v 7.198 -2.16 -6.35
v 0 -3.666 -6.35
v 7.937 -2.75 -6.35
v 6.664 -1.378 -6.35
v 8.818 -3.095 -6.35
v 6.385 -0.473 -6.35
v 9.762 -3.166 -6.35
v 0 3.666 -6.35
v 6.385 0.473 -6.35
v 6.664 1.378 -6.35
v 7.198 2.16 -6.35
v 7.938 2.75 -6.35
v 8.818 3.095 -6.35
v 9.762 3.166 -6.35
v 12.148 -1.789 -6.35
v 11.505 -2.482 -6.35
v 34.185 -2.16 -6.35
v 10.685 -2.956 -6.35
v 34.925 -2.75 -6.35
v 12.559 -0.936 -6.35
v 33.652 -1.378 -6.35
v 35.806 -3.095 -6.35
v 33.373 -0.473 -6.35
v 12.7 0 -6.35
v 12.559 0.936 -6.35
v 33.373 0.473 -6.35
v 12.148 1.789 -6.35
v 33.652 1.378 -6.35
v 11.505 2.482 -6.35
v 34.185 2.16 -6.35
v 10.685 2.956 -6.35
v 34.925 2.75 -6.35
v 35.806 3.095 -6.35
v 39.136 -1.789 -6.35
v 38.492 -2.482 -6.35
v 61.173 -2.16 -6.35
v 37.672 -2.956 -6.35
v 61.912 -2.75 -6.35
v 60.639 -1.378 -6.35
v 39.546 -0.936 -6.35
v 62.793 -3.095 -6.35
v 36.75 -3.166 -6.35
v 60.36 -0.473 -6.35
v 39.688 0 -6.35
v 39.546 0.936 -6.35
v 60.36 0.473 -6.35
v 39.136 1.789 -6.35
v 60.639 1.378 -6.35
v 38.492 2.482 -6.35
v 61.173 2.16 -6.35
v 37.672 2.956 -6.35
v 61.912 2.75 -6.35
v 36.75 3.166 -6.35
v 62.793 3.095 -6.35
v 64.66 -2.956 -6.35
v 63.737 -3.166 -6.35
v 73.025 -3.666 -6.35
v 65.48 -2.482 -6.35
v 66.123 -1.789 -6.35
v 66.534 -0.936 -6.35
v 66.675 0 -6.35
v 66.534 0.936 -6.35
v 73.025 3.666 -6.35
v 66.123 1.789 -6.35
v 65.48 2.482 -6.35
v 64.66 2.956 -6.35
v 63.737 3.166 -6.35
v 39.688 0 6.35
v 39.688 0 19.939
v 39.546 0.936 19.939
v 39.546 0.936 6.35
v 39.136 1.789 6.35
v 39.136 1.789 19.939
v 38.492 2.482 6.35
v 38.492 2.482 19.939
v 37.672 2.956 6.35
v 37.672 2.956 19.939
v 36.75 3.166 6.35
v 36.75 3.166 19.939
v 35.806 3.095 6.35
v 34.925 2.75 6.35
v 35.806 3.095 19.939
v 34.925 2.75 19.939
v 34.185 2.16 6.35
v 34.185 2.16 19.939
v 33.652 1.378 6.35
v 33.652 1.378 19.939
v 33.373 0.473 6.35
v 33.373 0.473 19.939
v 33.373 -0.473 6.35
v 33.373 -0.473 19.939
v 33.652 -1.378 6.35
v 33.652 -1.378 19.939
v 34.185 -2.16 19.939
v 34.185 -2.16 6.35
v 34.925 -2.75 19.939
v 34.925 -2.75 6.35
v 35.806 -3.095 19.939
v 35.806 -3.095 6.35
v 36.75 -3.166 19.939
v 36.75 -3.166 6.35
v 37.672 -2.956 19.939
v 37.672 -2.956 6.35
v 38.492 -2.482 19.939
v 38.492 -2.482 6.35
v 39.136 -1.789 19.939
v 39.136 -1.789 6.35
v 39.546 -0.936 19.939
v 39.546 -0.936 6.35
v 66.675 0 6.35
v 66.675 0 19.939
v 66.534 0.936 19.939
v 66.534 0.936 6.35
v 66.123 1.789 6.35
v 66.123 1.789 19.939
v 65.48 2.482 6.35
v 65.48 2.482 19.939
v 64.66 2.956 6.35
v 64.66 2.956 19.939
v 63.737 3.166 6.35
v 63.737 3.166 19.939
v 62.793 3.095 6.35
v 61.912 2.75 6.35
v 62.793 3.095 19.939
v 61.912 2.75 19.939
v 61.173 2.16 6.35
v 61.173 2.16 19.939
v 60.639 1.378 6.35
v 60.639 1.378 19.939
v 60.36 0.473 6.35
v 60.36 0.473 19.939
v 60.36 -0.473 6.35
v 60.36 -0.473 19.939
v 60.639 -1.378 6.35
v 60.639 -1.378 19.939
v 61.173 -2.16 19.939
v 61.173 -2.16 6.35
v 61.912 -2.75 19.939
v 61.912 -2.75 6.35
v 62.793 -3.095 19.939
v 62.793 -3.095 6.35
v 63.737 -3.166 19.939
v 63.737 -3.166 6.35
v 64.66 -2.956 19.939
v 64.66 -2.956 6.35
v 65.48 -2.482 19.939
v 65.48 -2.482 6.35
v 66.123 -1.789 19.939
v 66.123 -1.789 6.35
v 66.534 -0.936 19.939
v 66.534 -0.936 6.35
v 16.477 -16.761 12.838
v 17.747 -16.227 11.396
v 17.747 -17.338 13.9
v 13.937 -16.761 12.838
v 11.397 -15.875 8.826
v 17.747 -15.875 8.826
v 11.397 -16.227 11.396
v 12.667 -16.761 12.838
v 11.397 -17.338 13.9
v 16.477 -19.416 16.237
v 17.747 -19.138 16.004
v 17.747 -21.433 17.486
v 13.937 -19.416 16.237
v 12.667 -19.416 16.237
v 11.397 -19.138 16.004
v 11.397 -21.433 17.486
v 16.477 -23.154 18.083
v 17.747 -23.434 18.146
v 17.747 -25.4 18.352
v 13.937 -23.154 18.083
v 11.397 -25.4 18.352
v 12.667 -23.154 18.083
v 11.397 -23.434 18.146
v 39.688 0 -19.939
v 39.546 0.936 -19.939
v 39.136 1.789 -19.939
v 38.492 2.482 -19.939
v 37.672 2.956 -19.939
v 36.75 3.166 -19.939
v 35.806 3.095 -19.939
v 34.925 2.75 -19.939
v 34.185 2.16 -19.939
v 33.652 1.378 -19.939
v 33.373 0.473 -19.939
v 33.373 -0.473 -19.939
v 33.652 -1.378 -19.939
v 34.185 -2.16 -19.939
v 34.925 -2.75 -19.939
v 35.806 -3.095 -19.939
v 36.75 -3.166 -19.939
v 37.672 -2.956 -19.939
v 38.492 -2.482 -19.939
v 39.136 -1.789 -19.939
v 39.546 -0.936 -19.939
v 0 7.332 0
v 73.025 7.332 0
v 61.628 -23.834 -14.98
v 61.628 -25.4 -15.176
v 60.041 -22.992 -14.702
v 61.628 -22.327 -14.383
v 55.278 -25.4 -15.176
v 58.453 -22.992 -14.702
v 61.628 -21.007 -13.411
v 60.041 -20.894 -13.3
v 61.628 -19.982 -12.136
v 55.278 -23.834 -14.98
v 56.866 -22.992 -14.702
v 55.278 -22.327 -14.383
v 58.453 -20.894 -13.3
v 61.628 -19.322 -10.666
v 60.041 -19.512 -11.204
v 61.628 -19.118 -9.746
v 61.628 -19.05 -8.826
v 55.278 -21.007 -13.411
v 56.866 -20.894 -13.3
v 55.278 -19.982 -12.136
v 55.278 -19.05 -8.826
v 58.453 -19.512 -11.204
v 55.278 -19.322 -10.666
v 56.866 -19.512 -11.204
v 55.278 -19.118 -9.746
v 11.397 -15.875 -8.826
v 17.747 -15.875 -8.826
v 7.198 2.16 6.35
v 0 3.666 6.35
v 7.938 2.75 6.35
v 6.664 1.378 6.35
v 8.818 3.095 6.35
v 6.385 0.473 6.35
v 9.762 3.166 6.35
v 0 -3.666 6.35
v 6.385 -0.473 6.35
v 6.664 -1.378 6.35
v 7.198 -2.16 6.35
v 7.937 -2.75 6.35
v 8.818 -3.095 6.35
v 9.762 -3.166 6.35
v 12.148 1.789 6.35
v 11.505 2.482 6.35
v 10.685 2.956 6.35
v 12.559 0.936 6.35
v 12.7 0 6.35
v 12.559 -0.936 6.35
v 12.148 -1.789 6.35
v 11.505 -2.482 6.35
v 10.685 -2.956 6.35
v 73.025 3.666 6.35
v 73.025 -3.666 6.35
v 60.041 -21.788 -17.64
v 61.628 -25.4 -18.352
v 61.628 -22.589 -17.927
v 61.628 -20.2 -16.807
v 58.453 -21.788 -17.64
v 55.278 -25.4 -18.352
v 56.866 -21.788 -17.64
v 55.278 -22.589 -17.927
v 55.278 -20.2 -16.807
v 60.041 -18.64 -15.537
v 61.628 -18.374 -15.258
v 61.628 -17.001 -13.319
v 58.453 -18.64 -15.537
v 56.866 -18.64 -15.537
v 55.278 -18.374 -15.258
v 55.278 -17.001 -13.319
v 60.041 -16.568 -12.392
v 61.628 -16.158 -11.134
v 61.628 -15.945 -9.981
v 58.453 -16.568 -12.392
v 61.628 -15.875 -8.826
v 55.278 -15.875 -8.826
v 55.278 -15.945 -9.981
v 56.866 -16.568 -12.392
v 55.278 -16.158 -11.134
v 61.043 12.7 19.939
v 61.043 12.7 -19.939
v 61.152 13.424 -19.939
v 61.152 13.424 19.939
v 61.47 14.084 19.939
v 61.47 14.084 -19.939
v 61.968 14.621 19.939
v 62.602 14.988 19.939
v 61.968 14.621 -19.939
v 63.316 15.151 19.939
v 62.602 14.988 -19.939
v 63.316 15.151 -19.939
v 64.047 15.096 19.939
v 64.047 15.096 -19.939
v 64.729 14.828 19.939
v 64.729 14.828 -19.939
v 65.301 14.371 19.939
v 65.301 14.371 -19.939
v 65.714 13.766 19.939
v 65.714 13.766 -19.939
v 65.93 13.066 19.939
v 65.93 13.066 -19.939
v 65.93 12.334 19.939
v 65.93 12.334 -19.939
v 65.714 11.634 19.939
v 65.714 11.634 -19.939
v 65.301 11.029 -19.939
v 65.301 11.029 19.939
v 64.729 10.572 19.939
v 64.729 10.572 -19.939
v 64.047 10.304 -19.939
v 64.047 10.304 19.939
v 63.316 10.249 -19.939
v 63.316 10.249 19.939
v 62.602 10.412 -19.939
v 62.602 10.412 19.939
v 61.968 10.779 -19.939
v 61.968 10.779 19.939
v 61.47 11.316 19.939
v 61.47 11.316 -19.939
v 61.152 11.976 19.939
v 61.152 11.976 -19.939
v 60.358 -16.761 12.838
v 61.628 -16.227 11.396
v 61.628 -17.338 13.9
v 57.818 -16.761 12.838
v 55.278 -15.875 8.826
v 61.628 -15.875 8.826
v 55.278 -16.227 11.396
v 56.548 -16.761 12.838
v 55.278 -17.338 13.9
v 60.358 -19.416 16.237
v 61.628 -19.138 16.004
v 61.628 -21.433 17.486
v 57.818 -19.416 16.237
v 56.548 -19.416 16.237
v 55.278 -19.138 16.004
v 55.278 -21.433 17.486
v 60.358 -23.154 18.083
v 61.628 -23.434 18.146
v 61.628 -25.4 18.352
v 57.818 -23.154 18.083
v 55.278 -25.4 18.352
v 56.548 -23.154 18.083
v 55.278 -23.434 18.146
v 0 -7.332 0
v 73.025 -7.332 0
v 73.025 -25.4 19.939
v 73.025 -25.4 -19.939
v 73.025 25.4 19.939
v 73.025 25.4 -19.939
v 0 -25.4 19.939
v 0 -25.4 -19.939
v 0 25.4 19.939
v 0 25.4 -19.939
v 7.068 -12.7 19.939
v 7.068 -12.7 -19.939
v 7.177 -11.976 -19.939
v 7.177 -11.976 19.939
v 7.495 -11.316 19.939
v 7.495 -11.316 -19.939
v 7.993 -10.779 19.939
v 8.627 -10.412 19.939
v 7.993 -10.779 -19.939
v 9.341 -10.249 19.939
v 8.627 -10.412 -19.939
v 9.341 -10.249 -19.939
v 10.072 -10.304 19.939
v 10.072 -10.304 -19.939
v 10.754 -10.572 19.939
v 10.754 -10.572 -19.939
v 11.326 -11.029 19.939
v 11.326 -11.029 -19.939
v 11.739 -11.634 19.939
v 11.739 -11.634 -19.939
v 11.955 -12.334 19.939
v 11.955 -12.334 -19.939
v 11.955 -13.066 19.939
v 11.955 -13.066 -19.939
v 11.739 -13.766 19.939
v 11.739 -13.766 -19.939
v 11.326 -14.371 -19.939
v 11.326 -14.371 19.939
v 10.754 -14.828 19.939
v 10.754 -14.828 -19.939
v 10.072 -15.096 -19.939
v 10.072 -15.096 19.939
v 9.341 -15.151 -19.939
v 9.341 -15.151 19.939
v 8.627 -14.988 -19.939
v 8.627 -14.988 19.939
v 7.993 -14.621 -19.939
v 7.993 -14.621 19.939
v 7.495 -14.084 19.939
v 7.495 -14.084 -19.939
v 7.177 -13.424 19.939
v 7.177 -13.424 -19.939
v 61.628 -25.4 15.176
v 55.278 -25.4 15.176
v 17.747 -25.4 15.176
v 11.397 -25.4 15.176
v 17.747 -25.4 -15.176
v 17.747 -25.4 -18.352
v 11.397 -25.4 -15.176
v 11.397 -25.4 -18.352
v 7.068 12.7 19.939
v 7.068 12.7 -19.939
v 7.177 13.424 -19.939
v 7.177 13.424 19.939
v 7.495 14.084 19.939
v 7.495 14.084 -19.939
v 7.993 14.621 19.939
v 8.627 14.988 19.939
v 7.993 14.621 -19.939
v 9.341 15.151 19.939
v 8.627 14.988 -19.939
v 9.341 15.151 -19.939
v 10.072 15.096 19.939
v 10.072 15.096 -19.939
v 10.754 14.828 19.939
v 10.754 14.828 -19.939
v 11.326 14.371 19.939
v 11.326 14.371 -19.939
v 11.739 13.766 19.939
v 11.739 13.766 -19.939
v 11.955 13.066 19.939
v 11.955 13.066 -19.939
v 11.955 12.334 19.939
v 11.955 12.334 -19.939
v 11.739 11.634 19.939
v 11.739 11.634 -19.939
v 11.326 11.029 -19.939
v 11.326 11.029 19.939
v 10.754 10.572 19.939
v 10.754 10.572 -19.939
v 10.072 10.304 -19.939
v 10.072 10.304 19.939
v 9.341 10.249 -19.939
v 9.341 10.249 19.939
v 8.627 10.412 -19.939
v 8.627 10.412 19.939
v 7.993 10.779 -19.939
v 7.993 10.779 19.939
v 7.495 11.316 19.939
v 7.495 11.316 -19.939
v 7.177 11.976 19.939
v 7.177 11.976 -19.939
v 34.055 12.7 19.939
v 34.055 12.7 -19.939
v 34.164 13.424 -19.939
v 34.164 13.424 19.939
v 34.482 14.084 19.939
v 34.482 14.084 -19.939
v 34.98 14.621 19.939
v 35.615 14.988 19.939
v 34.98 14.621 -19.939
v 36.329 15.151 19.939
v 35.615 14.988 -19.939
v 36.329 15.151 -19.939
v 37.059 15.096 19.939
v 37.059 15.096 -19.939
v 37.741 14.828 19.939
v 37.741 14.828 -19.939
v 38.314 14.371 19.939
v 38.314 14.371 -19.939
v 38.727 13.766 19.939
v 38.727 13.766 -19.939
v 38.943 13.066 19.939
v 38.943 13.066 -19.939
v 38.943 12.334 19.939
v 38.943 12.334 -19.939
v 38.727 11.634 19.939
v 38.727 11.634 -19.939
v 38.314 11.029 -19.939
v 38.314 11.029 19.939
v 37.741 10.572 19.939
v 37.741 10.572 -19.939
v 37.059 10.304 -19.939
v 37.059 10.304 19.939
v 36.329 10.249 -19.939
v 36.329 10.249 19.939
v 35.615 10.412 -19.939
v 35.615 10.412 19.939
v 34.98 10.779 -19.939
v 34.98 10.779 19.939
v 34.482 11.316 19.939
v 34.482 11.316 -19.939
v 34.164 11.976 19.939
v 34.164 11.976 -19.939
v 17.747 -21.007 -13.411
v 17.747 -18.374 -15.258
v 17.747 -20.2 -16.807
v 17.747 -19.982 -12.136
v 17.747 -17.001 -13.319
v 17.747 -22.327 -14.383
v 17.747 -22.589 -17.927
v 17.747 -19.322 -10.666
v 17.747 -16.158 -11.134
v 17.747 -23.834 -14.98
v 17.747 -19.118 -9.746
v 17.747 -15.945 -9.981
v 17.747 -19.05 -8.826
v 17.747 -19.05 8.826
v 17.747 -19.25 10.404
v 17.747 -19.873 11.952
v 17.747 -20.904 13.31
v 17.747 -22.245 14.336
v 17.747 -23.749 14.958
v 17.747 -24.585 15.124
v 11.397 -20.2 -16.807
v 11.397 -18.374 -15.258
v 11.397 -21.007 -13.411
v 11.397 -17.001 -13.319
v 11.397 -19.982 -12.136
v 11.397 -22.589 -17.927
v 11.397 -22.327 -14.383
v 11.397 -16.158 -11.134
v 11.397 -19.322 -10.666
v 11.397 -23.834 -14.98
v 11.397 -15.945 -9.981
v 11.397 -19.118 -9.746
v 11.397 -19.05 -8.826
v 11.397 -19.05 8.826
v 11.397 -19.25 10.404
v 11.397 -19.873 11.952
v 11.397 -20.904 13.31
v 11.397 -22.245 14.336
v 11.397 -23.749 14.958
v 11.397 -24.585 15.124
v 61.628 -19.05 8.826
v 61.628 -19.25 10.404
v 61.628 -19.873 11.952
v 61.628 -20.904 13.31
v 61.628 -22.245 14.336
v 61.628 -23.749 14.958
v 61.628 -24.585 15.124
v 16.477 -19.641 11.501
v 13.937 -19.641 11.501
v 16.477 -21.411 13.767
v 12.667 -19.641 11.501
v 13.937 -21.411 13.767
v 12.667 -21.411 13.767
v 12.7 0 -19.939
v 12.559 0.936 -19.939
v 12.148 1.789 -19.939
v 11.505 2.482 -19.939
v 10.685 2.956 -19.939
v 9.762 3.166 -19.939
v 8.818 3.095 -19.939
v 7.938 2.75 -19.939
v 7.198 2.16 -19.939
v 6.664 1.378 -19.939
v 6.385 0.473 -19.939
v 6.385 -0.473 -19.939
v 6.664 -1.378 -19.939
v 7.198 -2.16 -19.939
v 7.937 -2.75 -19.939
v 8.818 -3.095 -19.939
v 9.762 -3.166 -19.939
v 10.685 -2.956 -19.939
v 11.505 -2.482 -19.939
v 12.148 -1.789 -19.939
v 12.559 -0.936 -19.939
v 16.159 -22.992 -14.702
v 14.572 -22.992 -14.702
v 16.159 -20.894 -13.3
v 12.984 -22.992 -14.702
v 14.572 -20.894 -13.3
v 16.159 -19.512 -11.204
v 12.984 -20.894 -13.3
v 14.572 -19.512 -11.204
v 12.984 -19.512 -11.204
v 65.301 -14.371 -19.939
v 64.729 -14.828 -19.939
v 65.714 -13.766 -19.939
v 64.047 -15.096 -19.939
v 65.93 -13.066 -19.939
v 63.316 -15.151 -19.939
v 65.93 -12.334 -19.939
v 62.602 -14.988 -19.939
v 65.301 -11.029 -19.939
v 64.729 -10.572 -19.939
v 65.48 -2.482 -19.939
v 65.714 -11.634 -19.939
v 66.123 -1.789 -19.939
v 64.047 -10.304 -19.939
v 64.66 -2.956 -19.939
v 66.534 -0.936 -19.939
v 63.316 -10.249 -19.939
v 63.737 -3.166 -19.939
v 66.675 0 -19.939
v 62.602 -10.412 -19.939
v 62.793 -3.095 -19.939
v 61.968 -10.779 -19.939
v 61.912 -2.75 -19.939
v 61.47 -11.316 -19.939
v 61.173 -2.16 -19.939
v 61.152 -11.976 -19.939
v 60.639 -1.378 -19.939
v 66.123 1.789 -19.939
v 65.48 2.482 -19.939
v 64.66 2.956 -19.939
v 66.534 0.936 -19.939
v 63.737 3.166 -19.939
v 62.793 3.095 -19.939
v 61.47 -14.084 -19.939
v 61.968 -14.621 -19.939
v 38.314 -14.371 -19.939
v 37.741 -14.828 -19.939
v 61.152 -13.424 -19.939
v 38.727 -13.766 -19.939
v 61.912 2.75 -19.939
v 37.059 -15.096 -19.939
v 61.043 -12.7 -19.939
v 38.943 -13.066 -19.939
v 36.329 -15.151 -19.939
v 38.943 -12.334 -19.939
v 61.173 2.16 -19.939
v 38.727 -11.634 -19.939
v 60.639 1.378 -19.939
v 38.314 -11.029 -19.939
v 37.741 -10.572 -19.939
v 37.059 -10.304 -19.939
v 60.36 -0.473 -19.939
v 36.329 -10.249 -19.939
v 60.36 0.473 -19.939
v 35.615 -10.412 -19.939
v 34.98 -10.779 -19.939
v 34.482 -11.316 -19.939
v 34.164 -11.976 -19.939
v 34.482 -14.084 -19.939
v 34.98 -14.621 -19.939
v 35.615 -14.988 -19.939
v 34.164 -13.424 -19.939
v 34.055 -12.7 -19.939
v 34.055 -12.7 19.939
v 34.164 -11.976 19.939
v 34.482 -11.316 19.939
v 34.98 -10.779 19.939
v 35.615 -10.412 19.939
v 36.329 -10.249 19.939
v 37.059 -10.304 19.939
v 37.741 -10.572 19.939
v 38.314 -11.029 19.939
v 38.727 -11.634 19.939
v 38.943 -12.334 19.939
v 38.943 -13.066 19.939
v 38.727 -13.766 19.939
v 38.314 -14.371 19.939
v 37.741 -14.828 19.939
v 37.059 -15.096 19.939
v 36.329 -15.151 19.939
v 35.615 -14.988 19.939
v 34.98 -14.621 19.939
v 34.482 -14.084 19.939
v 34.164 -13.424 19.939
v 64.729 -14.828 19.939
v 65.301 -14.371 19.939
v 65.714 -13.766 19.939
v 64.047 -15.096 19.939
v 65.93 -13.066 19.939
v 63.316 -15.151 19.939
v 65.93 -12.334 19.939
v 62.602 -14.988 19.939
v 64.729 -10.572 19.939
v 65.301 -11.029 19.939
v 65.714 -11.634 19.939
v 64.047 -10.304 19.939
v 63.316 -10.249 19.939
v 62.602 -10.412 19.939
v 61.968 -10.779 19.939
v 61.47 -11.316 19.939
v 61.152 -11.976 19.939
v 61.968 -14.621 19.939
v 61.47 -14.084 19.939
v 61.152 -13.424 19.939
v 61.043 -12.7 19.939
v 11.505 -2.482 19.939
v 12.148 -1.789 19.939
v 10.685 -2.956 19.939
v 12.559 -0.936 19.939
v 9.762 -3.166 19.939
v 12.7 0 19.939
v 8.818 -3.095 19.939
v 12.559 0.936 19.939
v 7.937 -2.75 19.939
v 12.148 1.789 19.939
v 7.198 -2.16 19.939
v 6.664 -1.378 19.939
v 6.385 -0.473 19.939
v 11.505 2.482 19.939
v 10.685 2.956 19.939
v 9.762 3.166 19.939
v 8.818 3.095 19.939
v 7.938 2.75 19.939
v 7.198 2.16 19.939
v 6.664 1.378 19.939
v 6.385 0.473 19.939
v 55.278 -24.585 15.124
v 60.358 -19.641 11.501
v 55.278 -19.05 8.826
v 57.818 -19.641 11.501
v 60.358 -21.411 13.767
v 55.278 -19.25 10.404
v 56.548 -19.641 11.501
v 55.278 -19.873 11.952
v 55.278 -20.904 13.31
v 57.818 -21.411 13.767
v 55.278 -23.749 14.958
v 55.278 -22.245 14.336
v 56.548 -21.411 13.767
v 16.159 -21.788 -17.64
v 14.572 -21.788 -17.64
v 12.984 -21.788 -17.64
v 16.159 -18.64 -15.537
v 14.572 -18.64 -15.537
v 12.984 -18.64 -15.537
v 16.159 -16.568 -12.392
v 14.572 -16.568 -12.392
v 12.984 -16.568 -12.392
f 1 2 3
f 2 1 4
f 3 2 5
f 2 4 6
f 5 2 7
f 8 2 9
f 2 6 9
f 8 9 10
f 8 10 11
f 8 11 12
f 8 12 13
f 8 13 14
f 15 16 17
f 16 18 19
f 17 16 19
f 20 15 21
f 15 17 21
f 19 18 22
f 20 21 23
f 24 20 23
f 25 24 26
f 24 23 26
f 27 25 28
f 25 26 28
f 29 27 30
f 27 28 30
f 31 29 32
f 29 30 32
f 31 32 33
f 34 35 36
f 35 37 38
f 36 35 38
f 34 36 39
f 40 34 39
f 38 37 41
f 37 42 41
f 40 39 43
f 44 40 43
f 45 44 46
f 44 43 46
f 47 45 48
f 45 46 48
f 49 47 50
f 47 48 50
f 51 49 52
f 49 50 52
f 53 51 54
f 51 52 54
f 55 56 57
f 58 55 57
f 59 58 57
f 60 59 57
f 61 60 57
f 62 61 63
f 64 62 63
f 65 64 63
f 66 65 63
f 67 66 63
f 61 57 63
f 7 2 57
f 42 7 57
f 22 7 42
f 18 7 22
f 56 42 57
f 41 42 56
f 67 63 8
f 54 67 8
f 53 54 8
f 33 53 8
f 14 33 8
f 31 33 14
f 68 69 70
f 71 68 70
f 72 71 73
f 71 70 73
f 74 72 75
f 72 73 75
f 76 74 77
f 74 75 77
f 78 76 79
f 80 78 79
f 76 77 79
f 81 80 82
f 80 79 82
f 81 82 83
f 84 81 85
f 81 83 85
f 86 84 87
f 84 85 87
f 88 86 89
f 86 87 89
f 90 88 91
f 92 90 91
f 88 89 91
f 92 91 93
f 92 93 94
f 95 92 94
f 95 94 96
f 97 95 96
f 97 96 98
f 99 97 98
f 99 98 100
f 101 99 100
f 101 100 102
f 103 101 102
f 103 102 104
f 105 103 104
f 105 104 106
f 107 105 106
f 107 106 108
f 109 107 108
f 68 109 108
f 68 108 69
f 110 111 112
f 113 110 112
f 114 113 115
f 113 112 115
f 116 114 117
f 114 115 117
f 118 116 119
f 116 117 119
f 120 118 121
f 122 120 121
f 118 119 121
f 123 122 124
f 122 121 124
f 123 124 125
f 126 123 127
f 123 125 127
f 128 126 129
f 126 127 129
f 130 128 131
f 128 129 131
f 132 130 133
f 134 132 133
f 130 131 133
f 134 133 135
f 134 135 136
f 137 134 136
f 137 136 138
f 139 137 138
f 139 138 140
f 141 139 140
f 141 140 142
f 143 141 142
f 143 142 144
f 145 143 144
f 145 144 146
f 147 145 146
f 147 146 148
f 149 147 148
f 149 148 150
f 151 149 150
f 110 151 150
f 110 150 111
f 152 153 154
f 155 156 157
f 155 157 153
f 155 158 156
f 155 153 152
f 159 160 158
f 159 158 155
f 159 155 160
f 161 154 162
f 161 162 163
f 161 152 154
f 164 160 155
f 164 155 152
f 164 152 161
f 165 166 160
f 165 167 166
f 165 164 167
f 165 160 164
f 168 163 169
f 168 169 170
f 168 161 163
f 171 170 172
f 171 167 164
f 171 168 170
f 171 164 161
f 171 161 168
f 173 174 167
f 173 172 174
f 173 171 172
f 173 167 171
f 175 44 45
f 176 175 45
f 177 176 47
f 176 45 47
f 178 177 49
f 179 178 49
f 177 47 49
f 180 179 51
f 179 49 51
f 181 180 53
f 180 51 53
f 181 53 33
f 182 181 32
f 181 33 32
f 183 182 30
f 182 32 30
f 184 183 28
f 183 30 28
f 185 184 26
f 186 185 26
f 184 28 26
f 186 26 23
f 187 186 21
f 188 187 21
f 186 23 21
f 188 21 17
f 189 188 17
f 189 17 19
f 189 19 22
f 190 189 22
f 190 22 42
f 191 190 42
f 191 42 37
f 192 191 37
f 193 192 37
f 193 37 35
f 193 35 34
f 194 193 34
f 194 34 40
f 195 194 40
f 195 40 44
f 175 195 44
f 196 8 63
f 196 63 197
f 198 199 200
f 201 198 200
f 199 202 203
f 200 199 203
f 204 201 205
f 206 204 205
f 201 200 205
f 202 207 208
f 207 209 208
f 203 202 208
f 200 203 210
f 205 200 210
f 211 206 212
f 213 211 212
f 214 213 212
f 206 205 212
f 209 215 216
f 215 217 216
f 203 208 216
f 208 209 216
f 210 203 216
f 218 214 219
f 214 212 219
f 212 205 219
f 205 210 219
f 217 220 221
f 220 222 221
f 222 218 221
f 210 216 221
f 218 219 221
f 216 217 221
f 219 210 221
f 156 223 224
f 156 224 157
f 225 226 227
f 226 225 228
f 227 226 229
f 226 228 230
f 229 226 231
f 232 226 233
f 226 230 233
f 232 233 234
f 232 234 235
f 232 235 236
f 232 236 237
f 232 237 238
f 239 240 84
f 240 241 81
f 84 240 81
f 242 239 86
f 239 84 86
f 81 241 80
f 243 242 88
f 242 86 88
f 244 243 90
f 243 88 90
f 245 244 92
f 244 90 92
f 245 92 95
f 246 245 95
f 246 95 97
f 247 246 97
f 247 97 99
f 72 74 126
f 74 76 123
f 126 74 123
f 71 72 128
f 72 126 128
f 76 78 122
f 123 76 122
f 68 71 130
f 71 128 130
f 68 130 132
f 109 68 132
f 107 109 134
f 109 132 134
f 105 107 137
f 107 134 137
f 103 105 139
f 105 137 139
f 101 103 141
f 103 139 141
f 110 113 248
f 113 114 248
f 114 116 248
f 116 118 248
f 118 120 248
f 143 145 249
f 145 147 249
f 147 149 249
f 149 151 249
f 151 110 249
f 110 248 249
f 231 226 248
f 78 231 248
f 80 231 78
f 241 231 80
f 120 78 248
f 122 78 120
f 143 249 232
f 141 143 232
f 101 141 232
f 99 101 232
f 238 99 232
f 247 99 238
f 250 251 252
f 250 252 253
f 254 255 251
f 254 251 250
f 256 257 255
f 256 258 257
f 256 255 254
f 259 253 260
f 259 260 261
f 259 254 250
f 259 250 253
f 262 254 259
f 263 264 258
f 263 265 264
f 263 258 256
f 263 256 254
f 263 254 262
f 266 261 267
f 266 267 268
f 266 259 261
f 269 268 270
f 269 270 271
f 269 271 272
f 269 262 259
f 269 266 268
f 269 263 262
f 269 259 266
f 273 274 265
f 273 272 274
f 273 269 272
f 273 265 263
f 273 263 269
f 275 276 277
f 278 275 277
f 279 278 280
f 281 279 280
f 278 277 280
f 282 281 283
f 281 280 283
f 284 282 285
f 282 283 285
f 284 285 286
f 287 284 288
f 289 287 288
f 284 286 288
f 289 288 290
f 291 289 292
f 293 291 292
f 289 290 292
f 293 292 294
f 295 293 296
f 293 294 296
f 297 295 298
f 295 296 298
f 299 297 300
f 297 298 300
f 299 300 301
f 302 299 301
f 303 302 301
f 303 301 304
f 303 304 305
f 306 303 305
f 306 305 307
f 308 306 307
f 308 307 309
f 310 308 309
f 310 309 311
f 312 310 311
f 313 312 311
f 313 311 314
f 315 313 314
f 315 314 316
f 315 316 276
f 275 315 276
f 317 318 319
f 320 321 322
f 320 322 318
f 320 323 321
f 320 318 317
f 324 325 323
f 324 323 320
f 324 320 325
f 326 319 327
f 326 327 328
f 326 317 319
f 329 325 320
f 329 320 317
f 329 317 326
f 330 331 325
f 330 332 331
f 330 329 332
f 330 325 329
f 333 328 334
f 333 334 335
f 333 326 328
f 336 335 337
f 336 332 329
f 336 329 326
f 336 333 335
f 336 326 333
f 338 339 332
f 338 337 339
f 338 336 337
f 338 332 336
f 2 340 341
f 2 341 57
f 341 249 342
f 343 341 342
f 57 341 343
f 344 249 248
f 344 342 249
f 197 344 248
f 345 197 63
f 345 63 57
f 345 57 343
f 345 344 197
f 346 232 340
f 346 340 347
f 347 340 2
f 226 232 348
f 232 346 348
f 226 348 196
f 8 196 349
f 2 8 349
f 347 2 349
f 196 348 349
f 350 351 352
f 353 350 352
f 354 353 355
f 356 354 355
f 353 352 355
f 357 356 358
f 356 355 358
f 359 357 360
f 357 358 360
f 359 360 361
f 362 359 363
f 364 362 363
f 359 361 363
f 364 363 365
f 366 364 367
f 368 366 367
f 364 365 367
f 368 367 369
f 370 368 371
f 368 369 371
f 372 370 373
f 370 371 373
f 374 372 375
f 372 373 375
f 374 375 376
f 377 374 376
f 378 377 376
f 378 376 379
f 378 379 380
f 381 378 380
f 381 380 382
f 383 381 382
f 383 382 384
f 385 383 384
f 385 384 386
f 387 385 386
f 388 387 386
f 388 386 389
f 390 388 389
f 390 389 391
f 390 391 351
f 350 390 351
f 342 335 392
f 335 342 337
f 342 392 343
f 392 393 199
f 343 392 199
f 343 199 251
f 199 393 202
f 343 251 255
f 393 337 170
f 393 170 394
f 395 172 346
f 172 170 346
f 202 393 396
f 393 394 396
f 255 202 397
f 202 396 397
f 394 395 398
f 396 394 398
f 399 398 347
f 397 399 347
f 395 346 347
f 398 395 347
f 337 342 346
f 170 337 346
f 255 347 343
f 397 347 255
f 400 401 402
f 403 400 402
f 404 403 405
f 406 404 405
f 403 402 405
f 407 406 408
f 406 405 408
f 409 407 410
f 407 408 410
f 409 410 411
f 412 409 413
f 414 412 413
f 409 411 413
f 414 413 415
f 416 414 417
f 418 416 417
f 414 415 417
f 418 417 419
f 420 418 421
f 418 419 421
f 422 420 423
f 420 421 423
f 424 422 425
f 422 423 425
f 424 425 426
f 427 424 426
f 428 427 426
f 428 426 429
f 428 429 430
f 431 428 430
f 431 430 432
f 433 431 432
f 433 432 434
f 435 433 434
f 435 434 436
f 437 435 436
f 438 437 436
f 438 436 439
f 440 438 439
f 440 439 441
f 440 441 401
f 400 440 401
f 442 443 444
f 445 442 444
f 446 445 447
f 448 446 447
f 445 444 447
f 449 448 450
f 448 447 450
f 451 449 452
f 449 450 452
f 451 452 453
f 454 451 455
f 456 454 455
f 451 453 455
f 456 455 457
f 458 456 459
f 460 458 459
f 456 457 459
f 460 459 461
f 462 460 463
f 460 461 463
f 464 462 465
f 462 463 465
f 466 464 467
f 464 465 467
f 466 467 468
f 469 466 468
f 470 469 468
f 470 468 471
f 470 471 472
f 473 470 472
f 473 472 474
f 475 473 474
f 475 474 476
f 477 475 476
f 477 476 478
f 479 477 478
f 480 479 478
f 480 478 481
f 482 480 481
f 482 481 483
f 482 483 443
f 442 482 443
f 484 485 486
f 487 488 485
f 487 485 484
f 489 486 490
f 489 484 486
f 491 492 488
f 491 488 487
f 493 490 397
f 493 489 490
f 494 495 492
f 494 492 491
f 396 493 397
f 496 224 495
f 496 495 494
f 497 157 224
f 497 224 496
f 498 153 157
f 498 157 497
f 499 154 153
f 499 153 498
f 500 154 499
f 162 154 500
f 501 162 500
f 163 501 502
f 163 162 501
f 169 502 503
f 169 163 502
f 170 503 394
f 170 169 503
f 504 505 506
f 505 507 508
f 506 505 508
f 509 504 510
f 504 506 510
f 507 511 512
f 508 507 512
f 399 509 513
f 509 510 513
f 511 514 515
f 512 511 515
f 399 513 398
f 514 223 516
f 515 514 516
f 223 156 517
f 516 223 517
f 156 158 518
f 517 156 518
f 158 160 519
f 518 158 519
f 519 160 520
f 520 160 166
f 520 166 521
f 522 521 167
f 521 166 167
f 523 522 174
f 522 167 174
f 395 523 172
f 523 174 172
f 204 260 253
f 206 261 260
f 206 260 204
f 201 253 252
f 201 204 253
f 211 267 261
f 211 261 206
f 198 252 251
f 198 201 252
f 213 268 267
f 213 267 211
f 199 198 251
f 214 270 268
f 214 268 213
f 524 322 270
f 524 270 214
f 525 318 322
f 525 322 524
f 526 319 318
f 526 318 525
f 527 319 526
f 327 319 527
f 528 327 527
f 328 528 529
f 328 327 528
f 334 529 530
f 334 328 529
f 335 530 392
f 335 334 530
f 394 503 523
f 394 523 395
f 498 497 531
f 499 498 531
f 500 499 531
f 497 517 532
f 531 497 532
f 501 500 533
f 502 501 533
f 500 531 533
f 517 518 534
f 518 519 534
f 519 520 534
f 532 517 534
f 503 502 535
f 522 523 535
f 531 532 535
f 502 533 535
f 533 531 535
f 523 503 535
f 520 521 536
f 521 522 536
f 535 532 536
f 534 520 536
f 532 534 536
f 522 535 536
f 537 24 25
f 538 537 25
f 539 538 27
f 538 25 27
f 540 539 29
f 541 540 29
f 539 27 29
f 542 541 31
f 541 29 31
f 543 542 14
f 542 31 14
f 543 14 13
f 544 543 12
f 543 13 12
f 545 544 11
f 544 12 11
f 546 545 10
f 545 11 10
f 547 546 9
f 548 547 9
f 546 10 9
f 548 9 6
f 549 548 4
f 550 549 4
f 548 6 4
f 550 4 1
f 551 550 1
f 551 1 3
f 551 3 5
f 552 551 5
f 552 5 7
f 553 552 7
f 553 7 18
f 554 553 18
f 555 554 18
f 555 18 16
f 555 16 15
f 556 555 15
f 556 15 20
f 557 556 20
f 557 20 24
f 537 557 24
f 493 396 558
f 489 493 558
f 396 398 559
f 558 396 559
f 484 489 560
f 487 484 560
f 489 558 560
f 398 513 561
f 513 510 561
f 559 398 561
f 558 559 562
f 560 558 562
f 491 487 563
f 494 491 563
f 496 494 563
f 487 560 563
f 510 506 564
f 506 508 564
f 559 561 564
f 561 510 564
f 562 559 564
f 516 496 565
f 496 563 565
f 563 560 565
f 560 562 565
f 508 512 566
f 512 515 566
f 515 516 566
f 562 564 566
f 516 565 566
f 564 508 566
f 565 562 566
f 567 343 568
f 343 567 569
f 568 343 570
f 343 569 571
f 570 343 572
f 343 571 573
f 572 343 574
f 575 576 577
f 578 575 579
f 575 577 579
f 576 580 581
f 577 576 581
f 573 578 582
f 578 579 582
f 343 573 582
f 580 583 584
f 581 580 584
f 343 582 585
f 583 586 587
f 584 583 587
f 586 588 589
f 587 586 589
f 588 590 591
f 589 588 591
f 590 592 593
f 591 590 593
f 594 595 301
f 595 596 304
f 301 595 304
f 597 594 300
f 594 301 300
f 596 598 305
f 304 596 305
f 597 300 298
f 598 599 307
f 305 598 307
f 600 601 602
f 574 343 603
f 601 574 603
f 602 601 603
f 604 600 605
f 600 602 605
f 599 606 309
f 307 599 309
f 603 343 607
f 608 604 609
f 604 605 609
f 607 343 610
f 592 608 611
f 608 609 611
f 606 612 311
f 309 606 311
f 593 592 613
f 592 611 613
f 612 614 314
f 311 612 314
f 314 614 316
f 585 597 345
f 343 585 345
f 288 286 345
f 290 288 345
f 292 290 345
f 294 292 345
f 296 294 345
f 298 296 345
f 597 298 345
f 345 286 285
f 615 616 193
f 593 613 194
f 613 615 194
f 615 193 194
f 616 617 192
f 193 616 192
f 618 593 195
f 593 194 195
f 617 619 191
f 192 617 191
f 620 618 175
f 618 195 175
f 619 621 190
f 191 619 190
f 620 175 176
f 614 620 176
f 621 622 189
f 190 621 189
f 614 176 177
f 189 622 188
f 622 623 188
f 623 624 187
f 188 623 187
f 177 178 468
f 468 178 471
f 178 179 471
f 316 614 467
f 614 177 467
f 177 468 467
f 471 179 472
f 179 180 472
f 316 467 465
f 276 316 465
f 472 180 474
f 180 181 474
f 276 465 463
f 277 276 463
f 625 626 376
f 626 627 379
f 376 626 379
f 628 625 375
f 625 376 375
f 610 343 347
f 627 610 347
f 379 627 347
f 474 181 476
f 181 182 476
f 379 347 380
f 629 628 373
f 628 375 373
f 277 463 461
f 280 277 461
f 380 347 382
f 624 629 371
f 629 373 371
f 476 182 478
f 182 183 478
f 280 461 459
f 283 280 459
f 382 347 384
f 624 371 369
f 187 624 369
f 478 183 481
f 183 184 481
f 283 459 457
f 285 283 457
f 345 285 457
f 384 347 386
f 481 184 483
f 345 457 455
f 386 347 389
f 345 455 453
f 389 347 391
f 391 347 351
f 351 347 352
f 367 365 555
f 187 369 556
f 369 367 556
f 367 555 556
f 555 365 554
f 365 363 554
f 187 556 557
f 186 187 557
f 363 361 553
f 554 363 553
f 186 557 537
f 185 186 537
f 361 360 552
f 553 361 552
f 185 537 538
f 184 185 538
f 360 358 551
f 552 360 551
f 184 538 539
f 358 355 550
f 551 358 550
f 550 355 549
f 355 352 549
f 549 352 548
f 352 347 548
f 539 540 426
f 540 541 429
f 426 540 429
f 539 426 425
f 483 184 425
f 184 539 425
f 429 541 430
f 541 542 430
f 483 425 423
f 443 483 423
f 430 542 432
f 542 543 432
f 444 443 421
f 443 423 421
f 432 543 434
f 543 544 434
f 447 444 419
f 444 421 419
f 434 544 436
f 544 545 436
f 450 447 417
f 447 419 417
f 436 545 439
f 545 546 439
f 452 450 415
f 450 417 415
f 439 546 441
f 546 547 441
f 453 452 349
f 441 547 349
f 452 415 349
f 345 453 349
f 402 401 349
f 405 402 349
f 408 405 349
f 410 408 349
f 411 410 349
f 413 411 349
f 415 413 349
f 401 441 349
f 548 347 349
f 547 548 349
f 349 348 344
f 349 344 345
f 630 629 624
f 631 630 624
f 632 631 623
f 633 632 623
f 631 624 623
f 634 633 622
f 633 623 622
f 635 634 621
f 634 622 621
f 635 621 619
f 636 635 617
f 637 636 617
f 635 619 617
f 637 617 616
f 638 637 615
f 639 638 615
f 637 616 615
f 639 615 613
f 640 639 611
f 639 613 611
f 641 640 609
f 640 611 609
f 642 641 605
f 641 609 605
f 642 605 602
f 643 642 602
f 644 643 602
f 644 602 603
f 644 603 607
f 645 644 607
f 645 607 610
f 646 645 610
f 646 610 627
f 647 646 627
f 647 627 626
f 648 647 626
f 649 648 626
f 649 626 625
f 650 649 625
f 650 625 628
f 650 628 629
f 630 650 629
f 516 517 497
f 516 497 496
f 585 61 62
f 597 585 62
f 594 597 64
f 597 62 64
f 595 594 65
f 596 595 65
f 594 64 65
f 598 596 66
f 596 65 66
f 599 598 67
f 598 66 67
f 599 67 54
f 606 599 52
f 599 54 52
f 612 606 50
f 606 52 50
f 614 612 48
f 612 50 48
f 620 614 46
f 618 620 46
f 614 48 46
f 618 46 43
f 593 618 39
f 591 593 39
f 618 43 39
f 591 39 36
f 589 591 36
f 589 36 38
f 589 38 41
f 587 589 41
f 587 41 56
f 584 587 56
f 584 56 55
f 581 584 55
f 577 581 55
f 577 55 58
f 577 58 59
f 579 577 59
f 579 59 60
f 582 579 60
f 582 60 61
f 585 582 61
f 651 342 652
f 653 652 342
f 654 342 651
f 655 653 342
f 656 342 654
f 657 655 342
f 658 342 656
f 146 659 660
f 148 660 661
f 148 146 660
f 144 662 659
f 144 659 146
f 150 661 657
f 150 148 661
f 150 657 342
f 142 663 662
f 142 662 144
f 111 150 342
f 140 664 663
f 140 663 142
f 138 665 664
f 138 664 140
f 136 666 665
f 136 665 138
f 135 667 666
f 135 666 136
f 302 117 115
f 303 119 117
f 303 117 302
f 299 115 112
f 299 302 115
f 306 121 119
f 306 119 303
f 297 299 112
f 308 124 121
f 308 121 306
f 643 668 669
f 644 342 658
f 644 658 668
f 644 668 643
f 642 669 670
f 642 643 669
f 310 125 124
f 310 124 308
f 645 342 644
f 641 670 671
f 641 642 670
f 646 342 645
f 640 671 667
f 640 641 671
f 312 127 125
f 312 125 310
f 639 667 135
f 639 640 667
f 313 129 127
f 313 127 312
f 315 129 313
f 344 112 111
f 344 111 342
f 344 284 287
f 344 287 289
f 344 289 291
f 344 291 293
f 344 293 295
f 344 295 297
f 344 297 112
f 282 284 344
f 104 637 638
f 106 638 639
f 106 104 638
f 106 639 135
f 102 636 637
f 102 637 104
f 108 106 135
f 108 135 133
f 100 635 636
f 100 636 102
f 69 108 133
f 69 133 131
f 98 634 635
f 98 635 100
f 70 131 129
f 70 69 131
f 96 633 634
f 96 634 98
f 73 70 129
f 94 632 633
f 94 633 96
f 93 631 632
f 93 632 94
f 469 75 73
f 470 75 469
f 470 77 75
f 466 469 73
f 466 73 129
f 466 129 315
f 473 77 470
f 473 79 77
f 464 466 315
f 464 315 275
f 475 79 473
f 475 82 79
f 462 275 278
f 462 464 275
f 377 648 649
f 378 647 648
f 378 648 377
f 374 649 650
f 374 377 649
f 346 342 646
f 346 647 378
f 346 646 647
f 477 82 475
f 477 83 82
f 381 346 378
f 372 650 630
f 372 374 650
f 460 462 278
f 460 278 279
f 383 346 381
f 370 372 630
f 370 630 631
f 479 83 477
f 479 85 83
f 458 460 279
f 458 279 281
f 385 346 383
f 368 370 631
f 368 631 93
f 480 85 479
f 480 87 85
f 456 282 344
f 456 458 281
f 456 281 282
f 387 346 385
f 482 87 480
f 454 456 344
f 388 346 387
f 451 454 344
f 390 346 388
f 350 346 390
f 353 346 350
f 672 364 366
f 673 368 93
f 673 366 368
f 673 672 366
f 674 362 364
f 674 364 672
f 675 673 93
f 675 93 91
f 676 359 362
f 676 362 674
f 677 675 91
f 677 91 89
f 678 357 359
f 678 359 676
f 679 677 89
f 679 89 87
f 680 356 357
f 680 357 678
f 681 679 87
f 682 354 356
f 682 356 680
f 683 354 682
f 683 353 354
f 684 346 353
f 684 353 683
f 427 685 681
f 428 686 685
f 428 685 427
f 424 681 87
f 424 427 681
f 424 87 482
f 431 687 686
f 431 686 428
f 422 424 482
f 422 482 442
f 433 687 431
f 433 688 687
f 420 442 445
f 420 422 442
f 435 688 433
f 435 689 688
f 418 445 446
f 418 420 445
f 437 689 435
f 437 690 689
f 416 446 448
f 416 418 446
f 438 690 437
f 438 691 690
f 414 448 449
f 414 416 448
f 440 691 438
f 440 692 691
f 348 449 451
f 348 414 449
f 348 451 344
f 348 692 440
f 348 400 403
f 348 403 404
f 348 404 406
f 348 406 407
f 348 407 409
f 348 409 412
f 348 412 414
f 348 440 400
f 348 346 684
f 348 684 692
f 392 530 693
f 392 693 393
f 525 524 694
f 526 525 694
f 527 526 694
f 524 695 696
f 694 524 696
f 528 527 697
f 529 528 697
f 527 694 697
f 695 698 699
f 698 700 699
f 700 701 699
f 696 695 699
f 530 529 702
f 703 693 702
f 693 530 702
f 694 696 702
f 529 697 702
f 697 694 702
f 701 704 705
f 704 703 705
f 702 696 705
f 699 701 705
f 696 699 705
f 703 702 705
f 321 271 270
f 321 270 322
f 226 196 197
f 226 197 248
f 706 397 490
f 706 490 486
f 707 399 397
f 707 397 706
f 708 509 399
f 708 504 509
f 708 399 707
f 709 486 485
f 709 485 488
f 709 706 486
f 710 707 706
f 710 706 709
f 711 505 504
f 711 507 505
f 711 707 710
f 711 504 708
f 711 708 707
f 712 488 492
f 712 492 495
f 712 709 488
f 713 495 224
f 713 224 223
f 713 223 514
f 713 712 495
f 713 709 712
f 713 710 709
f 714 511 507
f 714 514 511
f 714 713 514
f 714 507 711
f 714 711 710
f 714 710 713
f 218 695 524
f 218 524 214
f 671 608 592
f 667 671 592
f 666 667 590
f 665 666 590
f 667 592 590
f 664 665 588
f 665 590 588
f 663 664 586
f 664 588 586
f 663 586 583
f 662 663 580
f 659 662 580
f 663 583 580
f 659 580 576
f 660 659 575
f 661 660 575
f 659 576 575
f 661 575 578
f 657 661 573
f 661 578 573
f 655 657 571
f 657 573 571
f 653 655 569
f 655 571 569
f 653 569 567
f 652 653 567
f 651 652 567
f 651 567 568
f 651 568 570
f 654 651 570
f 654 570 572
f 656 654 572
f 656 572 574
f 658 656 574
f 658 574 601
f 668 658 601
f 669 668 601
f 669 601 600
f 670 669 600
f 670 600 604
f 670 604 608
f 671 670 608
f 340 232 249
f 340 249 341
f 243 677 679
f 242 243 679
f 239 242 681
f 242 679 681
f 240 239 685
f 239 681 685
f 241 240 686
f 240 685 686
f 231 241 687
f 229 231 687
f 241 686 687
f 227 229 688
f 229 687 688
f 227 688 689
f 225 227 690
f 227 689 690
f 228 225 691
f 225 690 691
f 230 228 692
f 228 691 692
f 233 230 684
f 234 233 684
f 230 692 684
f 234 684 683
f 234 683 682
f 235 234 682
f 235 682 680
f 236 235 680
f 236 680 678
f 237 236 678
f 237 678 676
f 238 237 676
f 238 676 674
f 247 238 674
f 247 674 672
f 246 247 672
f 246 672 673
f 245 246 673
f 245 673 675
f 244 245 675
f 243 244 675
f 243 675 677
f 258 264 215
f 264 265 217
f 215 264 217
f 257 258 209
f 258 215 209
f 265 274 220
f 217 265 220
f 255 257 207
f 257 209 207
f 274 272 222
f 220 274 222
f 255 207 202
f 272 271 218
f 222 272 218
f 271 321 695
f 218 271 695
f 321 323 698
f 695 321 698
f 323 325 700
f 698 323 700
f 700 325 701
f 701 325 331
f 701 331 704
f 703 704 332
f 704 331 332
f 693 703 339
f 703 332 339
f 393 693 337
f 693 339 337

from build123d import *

# Parameters (mm, degrees)
SKETCH1_W                    = 39.878
SKETCH1_H                    = 50.8
BOSS_EXTRUDE1_DEPTH          = 73.025
CUT_EXTRUDE2_DEPTH           = 80.845941325
SKETCH9_R                    = 3.175
CUT_EXTRUDE4_DEPTH           = 87.994629196
CUT_SWEEP1_START             = 11.39698
CUT_SWEEP1_DEPTH             = 6.35
CUT_SWEEP1_START_2           = 55.27802
CUT_SWEEP1_2_DEPTH           = 6.35
F_10_0_1935_DIAMETER_HOLE1_D = 4.9149


# Read off the part's stored shape, not the designer's step: Cut-Sweep1
with BuildPart() as part:
    # Sketch1 → Boss-Extrude1 (new body)
    with BuildSketch(Plane(origin=(0, 0, 0), x_dir=(0, 0, -1), z_dir=(1, 0, 0))):
        Rectangle(SKETCH1_W, SKETCH1_H)
    extrude(amount=BOSS_EXTRUDE1_DEPTH)

    # Sketch3 → Cut-Extrude2 (cut, through all)
    with BuildSketch(Plane(origin=(73.025, 0, 0), x_dir=(0, 0, -1), z_dir=(1, 0, 0))):
        Polygon((6.35, 3.666174209), (0, 7.332348419), (-6.35, 3.666174209), (-6.35, -3.666174209), (0, -7.332348419), (6.35, -3.666174209), align=None)
    extrude(amount=-CUT_EXTRUDE2_DEPTH, mode=Mode.SUBTRACT)

    # Sketch9 → Cut-Extrude4 (cut, through all)
    with BuildSketch(Plane.XY.offset(19.939)):
        with Locations((9.525, 0)):
            Circle(SKETCH9_R)
        with Locations((36.5125, 0)):
            Circle(SKETCH9_R)
        with Locations((63.5, 0)):
            Circle(SKETCH9_R)
    extrude(amount=-CUT_EXTRUDE4_DEPTH, mode=Mode.SUBTRACT)

    # Cut-Sweep1 outline → Cut-Sweep1 (cut)
    with BuildSketch(Plane.YZ.offset(CUT_SWEEP1_START)):
        with BuildLine():
            add(Edge.make_bspline(
                [(-25.4, -15.1765), (-24.598155248, -15.176498148), (-23.769283214, -15.020738143), (-22.215051315, -14.383830521), (-21.491956074, -13.903011028), (-20.295262296, -12.697601351), (-19.822999045, -11.974685313), (-19.200412611, -10.432467289), (-19.050000001, -9.615195458), (-19.050000001, -8.8265)],
                knots=[0.025274121, 0.025274121, 0.025274121, 0.025274121, 0.088238261, 0.088238261, 0.1512024, 0.1512024, 0.214166539, 0.214166539, 0.277130679, 0.277130679, 0.277130679, 0.277130679], degree=3))
            Line((-25.4, -15.1765), (-25.4, -18.3515))
            add(Edge.make_bspline(
                [(-25.4, -18.3515), (-24.198801546, -18.351496292), (-22.962872636, -18.121523992), (-20.613629157, -17.158829003), (-19.544786623, -16.448168929), (-17.736040932, -14.626249639), (-17.037863537, -13.557113154), (-16.097253947, -11.227115749), (-15.875000001, -10.018094012), (-15.875000001, -8.8265)],
                knots=[0.025274121, 0.025274121, 0.025274121, 0.025274121, 0.088238261, 0.088238261, 0.1512024, 0.1512024, 0.214166539, 0.214166539, 0.277130679, 0.277130679, 0.277130679, 0.277130679], degree=3))
            Line((-15.875000001, -8.8265), (-15.875000001, 8.8265))
            add(Edge.make_bspline(
                [(-15.875000001, 8.8265), (-15.875000001, 10.154104999), (-16.148999917, 11.520161211), (-17.372865777, 14.155841649), (-18.276999964, 15.317491554), (-20.555768544, 17.157379798), (-21.841496853, 17.764411009), (-23.809992027, 18.242095131), (-24.446817823, 18.324942193), (-25.191458658, 18.349851774), (-25.29770495, 18.351585251), (-25.4, 18.351845725)],
                knots=[0.722867996, 0.722867996, 0.722867996, 0.722867996, 0.792150997, 0.792150997, 0.861433998, 0.861433998, 0.930716999, 0.930716999, 0.9653585, 0.9653585, 0.971358568, 0.971358568, 0.971358568, 0.971358568], degree=3))
            Line((-25.4, 18.351845725), (-25.4, 15.17649118))
            add(Edge.make_bspline(
                [(-19.050000001, 8.8265), (-19.050000001, 9.700178846), (-19.23785851, 10.633454764), (-20.043385287, 12.368213809), (-20.66121287, 13.161804707), (-22.160632803, 14.372442861), (-23.034678664, 14.786809878), (-24.336487637, 15.102712151), (-24.768983217, 15.158942974), (-25.259087559, 15.175338178), (-25.32981717, 15.176428808), (-25.4, 15.17649118)],
                knots=[0.722867996, 0.722867996, 0.722867996, 0.722867996, 0.792150997, 0.792150997, 0.861433998, 0.861433998, 0.930716999, 0.930716999, 0.9653585, 0.9653585, 0.971266218, 0.971266218, 0.971266218, 0.971266218], degree=3))
            Line((-19.050000001, 8.8265), (-19.050000001, -8.8265))
        make_face()
    extrude(amount=CUT_SWEEP1_DEPTH, mode=Mode.SUBTRACT)

    # Cut-Sweep1 2 outline → Cut-Sweep1 2 (cut)
    with BuildSketch(Plane.YZ.offset(CUT_SWEEP1_START_2)):
        with BuildLine():
            add(Edge.make_bspline(
                [(-25.4, -15.1765), (-24.598155248, -15.176498148), (-23.769283214, -15.020738143), (-22.215051315, -14.383830521), (-21.491956074, -13.903011028), (-20.295262296, -12.697601351), (-19.822999045, -11.974685313), (-19.200412611, -10.432467289), (-19.050000001, -9.615195458), (-19.050000001, -8.8265)],
                knots=[0.025274121, 0.025274121, 0.025274121, 0.025274121, 0.088238261, 0.088238261, 0.1512024, 0.1512024, 0.214166539, 0.214166539, 0.277130679, 0.277130679, 0.277130679, 0.277130679], degree=3))
            Line((-25.4, -15.1765), (-25.4, -18.3515))
            add(Edge.make_bspline(
                [(-25.4, -18.3515), (-24.198801546, -18.351496292), (-22.962872636, -18.121523992), (-20.613629157, -17.158829003), (-19.544786623, -16.448168929), (-17.736040932, -14.626249639), (-17.037863537, -13.557113154), (-16.097253947, -11.227115749), (-15.875000001, -10.018094012), (-15.875000001, -8.8265)],
                knots=[0.025274121, 0.025274121, 0.025274121, 0.025274121, 0.088238261, 0.088238261, 0.1512024, 0.1512024, 0.214166539, 0.214166539, 0.277130679, 0.277130679, 0.277130679, 0.277130679], degree=3))
            Line((-15.875000001, -8.8265), (-15.875000001, 8.8265))
            add(Edge.make_bspline(
                [(-15.875000001, 8.8265), (-15.875000001, 10.154104999), (-16.148999917, 11.520161211), (-17.372865777, 14.155841649), (-18.276999964, 15.317491554), (-20.555768544, 17.157379798), (-21.841496853, 17.764411009), (-23.809992027, 18.242095131), (-24.446817823, 18.324942193), (-25.191458658, 18.349851774), (-25.29770495, 18.351585251), (-25.4, 18.351845725)],
                knots=[0.722867996, 0.722867996, 0.722867996, 0.722867996, 0.792150997, 0.792150997, 0.861433998, 0.861433998, 0.930716999, 0.930716999, 0.9653585, 0.9653585, 0.971358568, 0.971358568, 0.971358568, 0.971358568], degree=3))
            Line((-25.4, 18.351845725), (-25.4, 15.17649118))
            add(Edge.make_bspline(
                [(-19.050000001, 8.8265), (-19.050000001, 9.700178846), (-19.23785851, 10.633454764), (-20.043385287, 12.368213809), (-20.66121287, 13.161804707), (-22.160632803, 14.372442861), (-23.034678664, 14.786809878), (-24.336487637, 15.102712151), (-24.768983217, 15.158942974), (-25.259087559, 15.175338178), (-25.32981717, 15.176428808), (-25.4, 15.17649118)],
                knots=[0.722867996, 0.722867996, 0.722867996, 0.722867996, 0.792150997, 0.792150997, 0.861433998, 0.861433998, 0.930716999, 0.930716999, 0.9653585, 0.9653585, 0.971266218, 0.971266218, 0.971266218, 0.971266218], degree=3))
            Line((-19.050000001, 8.8265), (-19.050000001, -8.8265))
        make_face()
    extrude(amount=CUT_SWEEP1_2_DEPTH, mode=Mode.SUBTRACT)

    # #10 (0.1935) Diameter Hole1 (through all)
    with Locations(Plane.XY.offset(19.939)):
        with Locations((9.525, 12.7), (36.5125, 12.7), (63.5, 12.7), (63.5, -12.7), (36.5125, -12.7), (9.525, -12.7)):
            Hole(F_10_0_1935_DIAMETER_HOLE1_D / 2)


solid = part.part
